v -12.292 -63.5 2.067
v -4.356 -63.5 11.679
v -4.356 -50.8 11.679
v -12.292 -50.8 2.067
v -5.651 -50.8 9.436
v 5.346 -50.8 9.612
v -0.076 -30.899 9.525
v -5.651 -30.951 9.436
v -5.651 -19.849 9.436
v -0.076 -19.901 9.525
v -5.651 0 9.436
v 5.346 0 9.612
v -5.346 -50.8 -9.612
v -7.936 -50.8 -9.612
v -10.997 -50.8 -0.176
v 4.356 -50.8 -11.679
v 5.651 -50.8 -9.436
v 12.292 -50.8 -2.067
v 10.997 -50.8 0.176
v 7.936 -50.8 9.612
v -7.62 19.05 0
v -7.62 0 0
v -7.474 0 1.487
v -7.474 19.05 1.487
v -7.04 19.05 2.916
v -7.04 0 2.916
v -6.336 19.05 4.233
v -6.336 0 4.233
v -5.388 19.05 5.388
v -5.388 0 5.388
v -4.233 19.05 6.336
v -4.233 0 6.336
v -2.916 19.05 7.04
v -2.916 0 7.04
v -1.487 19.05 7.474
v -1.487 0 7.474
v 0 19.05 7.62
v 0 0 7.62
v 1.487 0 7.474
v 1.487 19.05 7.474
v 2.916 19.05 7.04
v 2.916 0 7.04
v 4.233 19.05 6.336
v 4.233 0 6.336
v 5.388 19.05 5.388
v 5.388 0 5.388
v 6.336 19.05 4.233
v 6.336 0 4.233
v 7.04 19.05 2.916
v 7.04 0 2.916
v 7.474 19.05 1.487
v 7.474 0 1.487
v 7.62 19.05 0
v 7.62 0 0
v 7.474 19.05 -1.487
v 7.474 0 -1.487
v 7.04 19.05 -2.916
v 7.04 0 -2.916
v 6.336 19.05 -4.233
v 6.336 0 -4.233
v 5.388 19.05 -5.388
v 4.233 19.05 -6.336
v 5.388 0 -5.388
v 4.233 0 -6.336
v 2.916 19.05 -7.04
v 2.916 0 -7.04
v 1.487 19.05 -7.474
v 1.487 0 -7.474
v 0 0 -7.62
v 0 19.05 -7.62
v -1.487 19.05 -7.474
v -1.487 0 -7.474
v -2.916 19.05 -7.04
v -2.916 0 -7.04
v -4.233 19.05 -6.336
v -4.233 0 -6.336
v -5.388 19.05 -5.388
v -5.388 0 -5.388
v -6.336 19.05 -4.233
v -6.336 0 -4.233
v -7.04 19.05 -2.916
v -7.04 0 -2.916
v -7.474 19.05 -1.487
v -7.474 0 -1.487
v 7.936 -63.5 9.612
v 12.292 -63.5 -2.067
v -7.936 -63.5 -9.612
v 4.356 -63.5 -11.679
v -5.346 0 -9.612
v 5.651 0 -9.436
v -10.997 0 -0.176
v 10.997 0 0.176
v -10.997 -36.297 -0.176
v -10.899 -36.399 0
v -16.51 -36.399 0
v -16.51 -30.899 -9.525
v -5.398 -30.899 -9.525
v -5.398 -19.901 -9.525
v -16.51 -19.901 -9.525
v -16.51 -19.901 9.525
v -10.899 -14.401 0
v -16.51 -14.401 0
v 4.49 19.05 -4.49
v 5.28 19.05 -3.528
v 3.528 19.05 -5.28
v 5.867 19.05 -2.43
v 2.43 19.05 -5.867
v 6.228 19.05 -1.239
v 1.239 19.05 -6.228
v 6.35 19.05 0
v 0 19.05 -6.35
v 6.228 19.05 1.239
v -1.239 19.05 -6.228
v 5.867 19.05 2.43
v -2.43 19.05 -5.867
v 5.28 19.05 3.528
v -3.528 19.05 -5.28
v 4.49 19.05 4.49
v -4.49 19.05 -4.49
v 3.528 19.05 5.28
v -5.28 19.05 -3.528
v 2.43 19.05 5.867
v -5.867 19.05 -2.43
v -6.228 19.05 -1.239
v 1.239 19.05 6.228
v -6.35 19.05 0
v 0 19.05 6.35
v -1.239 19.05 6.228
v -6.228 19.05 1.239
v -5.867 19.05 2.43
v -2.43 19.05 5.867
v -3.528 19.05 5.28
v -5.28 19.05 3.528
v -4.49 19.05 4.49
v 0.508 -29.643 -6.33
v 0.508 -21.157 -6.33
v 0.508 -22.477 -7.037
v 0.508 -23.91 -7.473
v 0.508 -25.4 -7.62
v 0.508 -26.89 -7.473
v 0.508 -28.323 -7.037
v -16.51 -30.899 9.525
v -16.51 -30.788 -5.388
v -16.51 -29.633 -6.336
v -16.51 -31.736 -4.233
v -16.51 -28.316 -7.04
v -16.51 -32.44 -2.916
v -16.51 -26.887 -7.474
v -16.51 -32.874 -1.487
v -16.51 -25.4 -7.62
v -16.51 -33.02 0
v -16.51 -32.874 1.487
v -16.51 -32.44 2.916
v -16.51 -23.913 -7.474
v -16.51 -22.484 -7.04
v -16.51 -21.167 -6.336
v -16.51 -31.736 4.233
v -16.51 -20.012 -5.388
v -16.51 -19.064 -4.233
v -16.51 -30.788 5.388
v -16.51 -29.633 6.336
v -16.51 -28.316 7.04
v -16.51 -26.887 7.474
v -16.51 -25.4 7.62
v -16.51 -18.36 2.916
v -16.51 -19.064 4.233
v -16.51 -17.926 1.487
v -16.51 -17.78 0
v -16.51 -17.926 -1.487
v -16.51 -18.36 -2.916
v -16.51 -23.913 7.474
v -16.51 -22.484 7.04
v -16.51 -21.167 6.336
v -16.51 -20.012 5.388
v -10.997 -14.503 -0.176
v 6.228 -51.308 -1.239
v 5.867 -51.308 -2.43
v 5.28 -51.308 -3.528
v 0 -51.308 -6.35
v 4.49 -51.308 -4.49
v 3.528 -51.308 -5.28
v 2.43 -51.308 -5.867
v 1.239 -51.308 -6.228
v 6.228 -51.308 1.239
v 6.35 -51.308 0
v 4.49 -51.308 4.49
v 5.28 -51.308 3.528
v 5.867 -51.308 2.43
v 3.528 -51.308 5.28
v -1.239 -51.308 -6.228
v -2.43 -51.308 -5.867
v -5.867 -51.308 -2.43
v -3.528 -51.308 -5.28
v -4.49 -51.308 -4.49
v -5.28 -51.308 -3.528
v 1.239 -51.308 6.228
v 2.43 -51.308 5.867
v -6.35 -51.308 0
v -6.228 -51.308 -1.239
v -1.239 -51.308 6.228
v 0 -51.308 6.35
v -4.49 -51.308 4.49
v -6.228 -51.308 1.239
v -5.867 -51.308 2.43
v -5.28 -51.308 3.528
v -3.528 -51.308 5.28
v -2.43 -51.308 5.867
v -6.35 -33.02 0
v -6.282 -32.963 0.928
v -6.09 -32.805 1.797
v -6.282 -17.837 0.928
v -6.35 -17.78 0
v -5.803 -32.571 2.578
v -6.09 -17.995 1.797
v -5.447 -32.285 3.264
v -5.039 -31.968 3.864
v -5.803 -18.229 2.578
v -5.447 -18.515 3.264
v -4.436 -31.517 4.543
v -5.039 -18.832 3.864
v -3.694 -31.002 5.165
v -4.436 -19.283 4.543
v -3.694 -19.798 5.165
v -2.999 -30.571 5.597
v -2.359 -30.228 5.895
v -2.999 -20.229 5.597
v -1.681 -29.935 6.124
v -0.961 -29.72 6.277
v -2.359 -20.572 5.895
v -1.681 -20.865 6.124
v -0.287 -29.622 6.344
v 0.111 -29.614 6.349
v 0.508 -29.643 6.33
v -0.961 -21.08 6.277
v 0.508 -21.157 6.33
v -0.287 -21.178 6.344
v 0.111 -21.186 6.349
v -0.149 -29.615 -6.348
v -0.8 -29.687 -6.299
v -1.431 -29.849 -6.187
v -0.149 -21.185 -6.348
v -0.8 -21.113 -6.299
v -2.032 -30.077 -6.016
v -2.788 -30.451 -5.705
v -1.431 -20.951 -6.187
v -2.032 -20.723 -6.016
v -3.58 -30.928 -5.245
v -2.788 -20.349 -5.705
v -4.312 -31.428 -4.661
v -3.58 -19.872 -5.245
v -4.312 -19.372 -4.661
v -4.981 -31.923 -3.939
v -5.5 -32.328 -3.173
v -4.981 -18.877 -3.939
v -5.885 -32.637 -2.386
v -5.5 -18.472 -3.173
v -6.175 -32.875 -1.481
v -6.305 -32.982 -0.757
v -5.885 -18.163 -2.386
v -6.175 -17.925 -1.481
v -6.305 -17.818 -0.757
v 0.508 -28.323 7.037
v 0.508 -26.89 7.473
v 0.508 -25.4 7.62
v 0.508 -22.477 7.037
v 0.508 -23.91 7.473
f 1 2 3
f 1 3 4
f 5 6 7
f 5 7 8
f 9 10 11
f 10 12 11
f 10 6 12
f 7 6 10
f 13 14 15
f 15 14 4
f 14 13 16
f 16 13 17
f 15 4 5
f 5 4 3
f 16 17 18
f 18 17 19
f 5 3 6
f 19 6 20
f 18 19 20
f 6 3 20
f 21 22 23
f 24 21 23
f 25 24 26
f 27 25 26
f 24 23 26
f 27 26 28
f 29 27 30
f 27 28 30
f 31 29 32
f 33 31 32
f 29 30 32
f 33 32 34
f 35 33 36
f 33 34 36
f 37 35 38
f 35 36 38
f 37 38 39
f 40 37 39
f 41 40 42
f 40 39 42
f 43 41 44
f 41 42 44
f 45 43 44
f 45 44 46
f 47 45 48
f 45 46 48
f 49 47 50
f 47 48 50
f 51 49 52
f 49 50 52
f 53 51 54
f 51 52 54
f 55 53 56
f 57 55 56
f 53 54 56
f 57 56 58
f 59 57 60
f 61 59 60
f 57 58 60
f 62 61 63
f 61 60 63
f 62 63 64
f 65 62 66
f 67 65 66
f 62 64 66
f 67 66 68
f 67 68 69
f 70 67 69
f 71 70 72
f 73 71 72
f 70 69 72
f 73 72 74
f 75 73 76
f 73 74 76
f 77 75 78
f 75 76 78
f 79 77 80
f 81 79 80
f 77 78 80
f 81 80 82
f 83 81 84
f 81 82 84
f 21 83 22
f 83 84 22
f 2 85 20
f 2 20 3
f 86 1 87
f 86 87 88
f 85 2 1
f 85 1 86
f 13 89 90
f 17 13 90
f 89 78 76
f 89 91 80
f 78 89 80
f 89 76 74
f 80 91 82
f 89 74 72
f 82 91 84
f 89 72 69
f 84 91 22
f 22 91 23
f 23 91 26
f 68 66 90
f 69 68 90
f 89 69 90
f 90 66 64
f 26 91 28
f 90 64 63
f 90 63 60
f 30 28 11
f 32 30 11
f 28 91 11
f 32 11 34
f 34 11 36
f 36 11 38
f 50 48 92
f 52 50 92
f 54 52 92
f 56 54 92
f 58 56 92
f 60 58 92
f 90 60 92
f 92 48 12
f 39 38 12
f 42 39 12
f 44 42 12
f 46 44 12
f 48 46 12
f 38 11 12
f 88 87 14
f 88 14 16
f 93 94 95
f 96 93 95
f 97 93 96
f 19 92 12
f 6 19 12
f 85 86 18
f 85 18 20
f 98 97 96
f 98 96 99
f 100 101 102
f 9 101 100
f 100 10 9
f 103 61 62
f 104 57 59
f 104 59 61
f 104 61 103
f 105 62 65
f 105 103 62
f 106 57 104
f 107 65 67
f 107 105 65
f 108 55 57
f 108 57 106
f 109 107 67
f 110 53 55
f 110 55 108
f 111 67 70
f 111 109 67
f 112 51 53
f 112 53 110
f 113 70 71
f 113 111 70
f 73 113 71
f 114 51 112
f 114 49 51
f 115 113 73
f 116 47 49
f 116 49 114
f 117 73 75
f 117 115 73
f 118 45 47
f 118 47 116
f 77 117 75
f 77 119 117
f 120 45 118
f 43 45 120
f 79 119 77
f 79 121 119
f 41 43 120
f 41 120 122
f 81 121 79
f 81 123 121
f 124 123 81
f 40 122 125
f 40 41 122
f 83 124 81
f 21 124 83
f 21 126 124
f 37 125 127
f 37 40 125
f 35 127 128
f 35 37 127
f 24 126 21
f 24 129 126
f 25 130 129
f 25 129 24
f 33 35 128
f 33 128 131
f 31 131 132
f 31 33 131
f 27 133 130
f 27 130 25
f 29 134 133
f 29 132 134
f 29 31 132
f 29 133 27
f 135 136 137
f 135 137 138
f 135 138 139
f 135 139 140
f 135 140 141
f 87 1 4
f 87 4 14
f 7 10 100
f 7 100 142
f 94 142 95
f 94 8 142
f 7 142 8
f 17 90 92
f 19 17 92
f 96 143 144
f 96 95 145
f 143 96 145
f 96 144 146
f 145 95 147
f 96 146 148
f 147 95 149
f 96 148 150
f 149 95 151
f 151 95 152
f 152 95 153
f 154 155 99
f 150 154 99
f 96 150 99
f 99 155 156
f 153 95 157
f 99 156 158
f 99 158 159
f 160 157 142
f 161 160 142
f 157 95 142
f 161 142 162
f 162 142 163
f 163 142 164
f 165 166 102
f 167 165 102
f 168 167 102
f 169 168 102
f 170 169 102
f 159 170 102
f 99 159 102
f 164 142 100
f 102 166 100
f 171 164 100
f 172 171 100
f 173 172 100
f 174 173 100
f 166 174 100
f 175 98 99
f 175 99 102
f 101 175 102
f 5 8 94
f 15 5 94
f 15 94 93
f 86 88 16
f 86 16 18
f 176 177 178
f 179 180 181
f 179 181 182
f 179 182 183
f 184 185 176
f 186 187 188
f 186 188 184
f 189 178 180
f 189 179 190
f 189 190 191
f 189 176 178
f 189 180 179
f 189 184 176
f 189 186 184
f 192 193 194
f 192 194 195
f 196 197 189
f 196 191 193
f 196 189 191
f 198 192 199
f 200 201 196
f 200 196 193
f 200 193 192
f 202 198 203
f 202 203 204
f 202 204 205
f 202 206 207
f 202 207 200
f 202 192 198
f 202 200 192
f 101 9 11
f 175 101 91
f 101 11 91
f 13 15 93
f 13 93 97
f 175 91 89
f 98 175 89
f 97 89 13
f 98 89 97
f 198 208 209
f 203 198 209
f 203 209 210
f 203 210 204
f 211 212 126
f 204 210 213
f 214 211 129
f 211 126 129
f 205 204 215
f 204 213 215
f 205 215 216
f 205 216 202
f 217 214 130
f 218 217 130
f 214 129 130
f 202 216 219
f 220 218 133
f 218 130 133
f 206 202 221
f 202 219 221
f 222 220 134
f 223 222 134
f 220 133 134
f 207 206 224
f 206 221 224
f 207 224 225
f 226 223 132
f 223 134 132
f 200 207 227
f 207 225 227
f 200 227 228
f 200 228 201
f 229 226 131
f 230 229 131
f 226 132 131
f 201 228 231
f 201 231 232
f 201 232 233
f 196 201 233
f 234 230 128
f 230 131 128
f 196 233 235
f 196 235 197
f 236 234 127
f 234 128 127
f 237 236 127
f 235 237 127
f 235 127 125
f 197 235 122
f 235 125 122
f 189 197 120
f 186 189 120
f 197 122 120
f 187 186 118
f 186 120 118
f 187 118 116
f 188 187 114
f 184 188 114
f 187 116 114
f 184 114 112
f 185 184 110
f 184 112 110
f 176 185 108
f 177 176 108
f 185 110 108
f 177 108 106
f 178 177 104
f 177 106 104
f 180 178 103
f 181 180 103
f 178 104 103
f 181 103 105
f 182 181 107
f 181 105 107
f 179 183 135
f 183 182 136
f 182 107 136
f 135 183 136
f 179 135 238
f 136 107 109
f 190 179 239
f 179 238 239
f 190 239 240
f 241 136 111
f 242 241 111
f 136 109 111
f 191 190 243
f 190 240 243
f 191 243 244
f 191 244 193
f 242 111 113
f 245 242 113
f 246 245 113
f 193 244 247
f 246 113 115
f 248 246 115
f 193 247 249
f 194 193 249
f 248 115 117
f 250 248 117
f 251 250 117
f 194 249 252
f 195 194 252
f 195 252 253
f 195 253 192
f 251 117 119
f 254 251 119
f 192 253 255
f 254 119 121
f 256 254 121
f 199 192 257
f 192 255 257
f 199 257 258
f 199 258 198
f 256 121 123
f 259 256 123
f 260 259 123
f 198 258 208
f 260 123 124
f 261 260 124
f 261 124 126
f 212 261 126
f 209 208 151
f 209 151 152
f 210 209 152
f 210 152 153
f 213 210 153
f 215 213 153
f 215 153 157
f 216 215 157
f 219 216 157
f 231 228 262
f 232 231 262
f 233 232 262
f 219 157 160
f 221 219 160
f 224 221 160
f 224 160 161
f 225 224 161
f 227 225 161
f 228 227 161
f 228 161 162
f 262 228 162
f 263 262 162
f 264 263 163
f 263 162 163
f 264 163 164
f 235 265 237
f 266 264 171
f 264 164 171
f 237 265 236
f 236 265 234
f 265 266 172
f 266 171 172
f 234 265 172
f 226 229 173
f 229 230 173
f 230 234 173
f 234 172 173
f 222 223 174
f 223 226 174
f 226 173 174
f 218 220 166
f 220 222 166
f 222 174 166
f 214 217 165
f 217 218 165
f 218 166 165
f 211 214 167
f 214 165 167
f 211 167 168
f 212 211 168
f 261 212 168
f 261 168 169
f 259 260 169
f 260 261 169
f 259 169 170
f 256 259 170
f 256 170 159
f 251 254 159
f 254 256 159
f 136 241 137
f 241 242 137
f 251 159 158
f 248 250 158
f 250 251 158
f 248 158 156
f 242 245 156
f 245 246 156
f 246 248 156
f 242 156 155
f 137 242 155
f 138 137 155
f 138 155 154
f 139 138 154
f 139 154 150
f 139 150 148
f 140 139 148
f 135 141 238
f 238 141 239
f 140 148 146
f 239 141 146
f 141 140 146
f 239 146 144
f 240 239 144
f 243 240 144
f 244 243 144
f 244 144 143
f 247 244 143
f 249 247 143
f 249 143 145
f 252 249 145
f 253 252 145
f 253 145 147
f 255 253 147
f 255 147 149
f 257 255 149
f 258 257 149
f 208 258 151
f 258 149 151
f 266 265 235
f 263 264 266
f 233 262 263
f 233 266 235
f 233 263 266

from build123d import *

# Parameters (mm, degrees)
F1_DEPTH  = 50.8
F3_DEPTH  = 16.51
F6_DEPTH  = 12.7
F4_R      = 7.62
F7_DEPTH  = 19.05
F8_R      = 6.35
F9_DEPTH  = 70.358
F10_R     = 7.62
F11_DEPTH = 17.018


with BuildPart() as f1:
    # F0 (on Front) → F1 (new body)
    with BuildSketch(Plane.XZ):
        Polygon((-5.651368, 9.435547), (-10.997107, -0.176455), (-5.345739, -9.612001), (5.651368, -9.435547), (10.997107, 0.176455), (5.345739, 9.612001), align=None)
    extrude(amount=F1_DEPTH)

    # F2 (on Right) → F3 (join)
    with BuildSketch(Plane.YZ):
        Polygon((-19.900739, 9.525), (-30.899261, 9.525), (-36.398523, 0), (-30.899261, -9.525), (-19.900739, -9.525), (-14.401477, 0), align=None)
    extrude(amount=-F3_DEPTH)

    # F5 (on face) → F6 (join)
    with BuildSketch(Plane.XZ.offset(50.8)):
        Polygon((-4.356068, 11.679071), (-12.292406, 2.06707), (-7.936338, -9.612001), (4.356068, -11.679071), (12.292406, -2.06707), (7.936338, 9.612001), align=None)
    extrude(amount=F6_DEPTH)

    # F4 (on face) → F7 (join)
    with BuildSketch(Plane(origin=(0, 0, 0), x_dir=(-1, 0, 0), z_dir=(0, 1, 0))):
        Circle(F4_R)
    extrude(amount=F7_DEPTH)

    # F8 (on face) → F9 (cut)
    with BuildSketch(Plane(origin=(0, 19.05, 0), x_dir=(-1, 0, 0), z_dir=(0, 1, 0))):
        Circle(F8_R)
    extrude(amount=-F9_DEPTH, mode=Mode.SUBTRACT)

    # F10 (on face) → F11 (cut)
    with BuildSketch(Plane(origin=(-16.51, 0, 0), x_dir=(0, -1, 0), z_dir=(-1, 0, 0))):
        with Locations((25.4, 0)):
            Circle(F10_R)
    extrude(amount=-F11_DEPTH, mode=Mode.SUBTRACT)


solid = f1.part
